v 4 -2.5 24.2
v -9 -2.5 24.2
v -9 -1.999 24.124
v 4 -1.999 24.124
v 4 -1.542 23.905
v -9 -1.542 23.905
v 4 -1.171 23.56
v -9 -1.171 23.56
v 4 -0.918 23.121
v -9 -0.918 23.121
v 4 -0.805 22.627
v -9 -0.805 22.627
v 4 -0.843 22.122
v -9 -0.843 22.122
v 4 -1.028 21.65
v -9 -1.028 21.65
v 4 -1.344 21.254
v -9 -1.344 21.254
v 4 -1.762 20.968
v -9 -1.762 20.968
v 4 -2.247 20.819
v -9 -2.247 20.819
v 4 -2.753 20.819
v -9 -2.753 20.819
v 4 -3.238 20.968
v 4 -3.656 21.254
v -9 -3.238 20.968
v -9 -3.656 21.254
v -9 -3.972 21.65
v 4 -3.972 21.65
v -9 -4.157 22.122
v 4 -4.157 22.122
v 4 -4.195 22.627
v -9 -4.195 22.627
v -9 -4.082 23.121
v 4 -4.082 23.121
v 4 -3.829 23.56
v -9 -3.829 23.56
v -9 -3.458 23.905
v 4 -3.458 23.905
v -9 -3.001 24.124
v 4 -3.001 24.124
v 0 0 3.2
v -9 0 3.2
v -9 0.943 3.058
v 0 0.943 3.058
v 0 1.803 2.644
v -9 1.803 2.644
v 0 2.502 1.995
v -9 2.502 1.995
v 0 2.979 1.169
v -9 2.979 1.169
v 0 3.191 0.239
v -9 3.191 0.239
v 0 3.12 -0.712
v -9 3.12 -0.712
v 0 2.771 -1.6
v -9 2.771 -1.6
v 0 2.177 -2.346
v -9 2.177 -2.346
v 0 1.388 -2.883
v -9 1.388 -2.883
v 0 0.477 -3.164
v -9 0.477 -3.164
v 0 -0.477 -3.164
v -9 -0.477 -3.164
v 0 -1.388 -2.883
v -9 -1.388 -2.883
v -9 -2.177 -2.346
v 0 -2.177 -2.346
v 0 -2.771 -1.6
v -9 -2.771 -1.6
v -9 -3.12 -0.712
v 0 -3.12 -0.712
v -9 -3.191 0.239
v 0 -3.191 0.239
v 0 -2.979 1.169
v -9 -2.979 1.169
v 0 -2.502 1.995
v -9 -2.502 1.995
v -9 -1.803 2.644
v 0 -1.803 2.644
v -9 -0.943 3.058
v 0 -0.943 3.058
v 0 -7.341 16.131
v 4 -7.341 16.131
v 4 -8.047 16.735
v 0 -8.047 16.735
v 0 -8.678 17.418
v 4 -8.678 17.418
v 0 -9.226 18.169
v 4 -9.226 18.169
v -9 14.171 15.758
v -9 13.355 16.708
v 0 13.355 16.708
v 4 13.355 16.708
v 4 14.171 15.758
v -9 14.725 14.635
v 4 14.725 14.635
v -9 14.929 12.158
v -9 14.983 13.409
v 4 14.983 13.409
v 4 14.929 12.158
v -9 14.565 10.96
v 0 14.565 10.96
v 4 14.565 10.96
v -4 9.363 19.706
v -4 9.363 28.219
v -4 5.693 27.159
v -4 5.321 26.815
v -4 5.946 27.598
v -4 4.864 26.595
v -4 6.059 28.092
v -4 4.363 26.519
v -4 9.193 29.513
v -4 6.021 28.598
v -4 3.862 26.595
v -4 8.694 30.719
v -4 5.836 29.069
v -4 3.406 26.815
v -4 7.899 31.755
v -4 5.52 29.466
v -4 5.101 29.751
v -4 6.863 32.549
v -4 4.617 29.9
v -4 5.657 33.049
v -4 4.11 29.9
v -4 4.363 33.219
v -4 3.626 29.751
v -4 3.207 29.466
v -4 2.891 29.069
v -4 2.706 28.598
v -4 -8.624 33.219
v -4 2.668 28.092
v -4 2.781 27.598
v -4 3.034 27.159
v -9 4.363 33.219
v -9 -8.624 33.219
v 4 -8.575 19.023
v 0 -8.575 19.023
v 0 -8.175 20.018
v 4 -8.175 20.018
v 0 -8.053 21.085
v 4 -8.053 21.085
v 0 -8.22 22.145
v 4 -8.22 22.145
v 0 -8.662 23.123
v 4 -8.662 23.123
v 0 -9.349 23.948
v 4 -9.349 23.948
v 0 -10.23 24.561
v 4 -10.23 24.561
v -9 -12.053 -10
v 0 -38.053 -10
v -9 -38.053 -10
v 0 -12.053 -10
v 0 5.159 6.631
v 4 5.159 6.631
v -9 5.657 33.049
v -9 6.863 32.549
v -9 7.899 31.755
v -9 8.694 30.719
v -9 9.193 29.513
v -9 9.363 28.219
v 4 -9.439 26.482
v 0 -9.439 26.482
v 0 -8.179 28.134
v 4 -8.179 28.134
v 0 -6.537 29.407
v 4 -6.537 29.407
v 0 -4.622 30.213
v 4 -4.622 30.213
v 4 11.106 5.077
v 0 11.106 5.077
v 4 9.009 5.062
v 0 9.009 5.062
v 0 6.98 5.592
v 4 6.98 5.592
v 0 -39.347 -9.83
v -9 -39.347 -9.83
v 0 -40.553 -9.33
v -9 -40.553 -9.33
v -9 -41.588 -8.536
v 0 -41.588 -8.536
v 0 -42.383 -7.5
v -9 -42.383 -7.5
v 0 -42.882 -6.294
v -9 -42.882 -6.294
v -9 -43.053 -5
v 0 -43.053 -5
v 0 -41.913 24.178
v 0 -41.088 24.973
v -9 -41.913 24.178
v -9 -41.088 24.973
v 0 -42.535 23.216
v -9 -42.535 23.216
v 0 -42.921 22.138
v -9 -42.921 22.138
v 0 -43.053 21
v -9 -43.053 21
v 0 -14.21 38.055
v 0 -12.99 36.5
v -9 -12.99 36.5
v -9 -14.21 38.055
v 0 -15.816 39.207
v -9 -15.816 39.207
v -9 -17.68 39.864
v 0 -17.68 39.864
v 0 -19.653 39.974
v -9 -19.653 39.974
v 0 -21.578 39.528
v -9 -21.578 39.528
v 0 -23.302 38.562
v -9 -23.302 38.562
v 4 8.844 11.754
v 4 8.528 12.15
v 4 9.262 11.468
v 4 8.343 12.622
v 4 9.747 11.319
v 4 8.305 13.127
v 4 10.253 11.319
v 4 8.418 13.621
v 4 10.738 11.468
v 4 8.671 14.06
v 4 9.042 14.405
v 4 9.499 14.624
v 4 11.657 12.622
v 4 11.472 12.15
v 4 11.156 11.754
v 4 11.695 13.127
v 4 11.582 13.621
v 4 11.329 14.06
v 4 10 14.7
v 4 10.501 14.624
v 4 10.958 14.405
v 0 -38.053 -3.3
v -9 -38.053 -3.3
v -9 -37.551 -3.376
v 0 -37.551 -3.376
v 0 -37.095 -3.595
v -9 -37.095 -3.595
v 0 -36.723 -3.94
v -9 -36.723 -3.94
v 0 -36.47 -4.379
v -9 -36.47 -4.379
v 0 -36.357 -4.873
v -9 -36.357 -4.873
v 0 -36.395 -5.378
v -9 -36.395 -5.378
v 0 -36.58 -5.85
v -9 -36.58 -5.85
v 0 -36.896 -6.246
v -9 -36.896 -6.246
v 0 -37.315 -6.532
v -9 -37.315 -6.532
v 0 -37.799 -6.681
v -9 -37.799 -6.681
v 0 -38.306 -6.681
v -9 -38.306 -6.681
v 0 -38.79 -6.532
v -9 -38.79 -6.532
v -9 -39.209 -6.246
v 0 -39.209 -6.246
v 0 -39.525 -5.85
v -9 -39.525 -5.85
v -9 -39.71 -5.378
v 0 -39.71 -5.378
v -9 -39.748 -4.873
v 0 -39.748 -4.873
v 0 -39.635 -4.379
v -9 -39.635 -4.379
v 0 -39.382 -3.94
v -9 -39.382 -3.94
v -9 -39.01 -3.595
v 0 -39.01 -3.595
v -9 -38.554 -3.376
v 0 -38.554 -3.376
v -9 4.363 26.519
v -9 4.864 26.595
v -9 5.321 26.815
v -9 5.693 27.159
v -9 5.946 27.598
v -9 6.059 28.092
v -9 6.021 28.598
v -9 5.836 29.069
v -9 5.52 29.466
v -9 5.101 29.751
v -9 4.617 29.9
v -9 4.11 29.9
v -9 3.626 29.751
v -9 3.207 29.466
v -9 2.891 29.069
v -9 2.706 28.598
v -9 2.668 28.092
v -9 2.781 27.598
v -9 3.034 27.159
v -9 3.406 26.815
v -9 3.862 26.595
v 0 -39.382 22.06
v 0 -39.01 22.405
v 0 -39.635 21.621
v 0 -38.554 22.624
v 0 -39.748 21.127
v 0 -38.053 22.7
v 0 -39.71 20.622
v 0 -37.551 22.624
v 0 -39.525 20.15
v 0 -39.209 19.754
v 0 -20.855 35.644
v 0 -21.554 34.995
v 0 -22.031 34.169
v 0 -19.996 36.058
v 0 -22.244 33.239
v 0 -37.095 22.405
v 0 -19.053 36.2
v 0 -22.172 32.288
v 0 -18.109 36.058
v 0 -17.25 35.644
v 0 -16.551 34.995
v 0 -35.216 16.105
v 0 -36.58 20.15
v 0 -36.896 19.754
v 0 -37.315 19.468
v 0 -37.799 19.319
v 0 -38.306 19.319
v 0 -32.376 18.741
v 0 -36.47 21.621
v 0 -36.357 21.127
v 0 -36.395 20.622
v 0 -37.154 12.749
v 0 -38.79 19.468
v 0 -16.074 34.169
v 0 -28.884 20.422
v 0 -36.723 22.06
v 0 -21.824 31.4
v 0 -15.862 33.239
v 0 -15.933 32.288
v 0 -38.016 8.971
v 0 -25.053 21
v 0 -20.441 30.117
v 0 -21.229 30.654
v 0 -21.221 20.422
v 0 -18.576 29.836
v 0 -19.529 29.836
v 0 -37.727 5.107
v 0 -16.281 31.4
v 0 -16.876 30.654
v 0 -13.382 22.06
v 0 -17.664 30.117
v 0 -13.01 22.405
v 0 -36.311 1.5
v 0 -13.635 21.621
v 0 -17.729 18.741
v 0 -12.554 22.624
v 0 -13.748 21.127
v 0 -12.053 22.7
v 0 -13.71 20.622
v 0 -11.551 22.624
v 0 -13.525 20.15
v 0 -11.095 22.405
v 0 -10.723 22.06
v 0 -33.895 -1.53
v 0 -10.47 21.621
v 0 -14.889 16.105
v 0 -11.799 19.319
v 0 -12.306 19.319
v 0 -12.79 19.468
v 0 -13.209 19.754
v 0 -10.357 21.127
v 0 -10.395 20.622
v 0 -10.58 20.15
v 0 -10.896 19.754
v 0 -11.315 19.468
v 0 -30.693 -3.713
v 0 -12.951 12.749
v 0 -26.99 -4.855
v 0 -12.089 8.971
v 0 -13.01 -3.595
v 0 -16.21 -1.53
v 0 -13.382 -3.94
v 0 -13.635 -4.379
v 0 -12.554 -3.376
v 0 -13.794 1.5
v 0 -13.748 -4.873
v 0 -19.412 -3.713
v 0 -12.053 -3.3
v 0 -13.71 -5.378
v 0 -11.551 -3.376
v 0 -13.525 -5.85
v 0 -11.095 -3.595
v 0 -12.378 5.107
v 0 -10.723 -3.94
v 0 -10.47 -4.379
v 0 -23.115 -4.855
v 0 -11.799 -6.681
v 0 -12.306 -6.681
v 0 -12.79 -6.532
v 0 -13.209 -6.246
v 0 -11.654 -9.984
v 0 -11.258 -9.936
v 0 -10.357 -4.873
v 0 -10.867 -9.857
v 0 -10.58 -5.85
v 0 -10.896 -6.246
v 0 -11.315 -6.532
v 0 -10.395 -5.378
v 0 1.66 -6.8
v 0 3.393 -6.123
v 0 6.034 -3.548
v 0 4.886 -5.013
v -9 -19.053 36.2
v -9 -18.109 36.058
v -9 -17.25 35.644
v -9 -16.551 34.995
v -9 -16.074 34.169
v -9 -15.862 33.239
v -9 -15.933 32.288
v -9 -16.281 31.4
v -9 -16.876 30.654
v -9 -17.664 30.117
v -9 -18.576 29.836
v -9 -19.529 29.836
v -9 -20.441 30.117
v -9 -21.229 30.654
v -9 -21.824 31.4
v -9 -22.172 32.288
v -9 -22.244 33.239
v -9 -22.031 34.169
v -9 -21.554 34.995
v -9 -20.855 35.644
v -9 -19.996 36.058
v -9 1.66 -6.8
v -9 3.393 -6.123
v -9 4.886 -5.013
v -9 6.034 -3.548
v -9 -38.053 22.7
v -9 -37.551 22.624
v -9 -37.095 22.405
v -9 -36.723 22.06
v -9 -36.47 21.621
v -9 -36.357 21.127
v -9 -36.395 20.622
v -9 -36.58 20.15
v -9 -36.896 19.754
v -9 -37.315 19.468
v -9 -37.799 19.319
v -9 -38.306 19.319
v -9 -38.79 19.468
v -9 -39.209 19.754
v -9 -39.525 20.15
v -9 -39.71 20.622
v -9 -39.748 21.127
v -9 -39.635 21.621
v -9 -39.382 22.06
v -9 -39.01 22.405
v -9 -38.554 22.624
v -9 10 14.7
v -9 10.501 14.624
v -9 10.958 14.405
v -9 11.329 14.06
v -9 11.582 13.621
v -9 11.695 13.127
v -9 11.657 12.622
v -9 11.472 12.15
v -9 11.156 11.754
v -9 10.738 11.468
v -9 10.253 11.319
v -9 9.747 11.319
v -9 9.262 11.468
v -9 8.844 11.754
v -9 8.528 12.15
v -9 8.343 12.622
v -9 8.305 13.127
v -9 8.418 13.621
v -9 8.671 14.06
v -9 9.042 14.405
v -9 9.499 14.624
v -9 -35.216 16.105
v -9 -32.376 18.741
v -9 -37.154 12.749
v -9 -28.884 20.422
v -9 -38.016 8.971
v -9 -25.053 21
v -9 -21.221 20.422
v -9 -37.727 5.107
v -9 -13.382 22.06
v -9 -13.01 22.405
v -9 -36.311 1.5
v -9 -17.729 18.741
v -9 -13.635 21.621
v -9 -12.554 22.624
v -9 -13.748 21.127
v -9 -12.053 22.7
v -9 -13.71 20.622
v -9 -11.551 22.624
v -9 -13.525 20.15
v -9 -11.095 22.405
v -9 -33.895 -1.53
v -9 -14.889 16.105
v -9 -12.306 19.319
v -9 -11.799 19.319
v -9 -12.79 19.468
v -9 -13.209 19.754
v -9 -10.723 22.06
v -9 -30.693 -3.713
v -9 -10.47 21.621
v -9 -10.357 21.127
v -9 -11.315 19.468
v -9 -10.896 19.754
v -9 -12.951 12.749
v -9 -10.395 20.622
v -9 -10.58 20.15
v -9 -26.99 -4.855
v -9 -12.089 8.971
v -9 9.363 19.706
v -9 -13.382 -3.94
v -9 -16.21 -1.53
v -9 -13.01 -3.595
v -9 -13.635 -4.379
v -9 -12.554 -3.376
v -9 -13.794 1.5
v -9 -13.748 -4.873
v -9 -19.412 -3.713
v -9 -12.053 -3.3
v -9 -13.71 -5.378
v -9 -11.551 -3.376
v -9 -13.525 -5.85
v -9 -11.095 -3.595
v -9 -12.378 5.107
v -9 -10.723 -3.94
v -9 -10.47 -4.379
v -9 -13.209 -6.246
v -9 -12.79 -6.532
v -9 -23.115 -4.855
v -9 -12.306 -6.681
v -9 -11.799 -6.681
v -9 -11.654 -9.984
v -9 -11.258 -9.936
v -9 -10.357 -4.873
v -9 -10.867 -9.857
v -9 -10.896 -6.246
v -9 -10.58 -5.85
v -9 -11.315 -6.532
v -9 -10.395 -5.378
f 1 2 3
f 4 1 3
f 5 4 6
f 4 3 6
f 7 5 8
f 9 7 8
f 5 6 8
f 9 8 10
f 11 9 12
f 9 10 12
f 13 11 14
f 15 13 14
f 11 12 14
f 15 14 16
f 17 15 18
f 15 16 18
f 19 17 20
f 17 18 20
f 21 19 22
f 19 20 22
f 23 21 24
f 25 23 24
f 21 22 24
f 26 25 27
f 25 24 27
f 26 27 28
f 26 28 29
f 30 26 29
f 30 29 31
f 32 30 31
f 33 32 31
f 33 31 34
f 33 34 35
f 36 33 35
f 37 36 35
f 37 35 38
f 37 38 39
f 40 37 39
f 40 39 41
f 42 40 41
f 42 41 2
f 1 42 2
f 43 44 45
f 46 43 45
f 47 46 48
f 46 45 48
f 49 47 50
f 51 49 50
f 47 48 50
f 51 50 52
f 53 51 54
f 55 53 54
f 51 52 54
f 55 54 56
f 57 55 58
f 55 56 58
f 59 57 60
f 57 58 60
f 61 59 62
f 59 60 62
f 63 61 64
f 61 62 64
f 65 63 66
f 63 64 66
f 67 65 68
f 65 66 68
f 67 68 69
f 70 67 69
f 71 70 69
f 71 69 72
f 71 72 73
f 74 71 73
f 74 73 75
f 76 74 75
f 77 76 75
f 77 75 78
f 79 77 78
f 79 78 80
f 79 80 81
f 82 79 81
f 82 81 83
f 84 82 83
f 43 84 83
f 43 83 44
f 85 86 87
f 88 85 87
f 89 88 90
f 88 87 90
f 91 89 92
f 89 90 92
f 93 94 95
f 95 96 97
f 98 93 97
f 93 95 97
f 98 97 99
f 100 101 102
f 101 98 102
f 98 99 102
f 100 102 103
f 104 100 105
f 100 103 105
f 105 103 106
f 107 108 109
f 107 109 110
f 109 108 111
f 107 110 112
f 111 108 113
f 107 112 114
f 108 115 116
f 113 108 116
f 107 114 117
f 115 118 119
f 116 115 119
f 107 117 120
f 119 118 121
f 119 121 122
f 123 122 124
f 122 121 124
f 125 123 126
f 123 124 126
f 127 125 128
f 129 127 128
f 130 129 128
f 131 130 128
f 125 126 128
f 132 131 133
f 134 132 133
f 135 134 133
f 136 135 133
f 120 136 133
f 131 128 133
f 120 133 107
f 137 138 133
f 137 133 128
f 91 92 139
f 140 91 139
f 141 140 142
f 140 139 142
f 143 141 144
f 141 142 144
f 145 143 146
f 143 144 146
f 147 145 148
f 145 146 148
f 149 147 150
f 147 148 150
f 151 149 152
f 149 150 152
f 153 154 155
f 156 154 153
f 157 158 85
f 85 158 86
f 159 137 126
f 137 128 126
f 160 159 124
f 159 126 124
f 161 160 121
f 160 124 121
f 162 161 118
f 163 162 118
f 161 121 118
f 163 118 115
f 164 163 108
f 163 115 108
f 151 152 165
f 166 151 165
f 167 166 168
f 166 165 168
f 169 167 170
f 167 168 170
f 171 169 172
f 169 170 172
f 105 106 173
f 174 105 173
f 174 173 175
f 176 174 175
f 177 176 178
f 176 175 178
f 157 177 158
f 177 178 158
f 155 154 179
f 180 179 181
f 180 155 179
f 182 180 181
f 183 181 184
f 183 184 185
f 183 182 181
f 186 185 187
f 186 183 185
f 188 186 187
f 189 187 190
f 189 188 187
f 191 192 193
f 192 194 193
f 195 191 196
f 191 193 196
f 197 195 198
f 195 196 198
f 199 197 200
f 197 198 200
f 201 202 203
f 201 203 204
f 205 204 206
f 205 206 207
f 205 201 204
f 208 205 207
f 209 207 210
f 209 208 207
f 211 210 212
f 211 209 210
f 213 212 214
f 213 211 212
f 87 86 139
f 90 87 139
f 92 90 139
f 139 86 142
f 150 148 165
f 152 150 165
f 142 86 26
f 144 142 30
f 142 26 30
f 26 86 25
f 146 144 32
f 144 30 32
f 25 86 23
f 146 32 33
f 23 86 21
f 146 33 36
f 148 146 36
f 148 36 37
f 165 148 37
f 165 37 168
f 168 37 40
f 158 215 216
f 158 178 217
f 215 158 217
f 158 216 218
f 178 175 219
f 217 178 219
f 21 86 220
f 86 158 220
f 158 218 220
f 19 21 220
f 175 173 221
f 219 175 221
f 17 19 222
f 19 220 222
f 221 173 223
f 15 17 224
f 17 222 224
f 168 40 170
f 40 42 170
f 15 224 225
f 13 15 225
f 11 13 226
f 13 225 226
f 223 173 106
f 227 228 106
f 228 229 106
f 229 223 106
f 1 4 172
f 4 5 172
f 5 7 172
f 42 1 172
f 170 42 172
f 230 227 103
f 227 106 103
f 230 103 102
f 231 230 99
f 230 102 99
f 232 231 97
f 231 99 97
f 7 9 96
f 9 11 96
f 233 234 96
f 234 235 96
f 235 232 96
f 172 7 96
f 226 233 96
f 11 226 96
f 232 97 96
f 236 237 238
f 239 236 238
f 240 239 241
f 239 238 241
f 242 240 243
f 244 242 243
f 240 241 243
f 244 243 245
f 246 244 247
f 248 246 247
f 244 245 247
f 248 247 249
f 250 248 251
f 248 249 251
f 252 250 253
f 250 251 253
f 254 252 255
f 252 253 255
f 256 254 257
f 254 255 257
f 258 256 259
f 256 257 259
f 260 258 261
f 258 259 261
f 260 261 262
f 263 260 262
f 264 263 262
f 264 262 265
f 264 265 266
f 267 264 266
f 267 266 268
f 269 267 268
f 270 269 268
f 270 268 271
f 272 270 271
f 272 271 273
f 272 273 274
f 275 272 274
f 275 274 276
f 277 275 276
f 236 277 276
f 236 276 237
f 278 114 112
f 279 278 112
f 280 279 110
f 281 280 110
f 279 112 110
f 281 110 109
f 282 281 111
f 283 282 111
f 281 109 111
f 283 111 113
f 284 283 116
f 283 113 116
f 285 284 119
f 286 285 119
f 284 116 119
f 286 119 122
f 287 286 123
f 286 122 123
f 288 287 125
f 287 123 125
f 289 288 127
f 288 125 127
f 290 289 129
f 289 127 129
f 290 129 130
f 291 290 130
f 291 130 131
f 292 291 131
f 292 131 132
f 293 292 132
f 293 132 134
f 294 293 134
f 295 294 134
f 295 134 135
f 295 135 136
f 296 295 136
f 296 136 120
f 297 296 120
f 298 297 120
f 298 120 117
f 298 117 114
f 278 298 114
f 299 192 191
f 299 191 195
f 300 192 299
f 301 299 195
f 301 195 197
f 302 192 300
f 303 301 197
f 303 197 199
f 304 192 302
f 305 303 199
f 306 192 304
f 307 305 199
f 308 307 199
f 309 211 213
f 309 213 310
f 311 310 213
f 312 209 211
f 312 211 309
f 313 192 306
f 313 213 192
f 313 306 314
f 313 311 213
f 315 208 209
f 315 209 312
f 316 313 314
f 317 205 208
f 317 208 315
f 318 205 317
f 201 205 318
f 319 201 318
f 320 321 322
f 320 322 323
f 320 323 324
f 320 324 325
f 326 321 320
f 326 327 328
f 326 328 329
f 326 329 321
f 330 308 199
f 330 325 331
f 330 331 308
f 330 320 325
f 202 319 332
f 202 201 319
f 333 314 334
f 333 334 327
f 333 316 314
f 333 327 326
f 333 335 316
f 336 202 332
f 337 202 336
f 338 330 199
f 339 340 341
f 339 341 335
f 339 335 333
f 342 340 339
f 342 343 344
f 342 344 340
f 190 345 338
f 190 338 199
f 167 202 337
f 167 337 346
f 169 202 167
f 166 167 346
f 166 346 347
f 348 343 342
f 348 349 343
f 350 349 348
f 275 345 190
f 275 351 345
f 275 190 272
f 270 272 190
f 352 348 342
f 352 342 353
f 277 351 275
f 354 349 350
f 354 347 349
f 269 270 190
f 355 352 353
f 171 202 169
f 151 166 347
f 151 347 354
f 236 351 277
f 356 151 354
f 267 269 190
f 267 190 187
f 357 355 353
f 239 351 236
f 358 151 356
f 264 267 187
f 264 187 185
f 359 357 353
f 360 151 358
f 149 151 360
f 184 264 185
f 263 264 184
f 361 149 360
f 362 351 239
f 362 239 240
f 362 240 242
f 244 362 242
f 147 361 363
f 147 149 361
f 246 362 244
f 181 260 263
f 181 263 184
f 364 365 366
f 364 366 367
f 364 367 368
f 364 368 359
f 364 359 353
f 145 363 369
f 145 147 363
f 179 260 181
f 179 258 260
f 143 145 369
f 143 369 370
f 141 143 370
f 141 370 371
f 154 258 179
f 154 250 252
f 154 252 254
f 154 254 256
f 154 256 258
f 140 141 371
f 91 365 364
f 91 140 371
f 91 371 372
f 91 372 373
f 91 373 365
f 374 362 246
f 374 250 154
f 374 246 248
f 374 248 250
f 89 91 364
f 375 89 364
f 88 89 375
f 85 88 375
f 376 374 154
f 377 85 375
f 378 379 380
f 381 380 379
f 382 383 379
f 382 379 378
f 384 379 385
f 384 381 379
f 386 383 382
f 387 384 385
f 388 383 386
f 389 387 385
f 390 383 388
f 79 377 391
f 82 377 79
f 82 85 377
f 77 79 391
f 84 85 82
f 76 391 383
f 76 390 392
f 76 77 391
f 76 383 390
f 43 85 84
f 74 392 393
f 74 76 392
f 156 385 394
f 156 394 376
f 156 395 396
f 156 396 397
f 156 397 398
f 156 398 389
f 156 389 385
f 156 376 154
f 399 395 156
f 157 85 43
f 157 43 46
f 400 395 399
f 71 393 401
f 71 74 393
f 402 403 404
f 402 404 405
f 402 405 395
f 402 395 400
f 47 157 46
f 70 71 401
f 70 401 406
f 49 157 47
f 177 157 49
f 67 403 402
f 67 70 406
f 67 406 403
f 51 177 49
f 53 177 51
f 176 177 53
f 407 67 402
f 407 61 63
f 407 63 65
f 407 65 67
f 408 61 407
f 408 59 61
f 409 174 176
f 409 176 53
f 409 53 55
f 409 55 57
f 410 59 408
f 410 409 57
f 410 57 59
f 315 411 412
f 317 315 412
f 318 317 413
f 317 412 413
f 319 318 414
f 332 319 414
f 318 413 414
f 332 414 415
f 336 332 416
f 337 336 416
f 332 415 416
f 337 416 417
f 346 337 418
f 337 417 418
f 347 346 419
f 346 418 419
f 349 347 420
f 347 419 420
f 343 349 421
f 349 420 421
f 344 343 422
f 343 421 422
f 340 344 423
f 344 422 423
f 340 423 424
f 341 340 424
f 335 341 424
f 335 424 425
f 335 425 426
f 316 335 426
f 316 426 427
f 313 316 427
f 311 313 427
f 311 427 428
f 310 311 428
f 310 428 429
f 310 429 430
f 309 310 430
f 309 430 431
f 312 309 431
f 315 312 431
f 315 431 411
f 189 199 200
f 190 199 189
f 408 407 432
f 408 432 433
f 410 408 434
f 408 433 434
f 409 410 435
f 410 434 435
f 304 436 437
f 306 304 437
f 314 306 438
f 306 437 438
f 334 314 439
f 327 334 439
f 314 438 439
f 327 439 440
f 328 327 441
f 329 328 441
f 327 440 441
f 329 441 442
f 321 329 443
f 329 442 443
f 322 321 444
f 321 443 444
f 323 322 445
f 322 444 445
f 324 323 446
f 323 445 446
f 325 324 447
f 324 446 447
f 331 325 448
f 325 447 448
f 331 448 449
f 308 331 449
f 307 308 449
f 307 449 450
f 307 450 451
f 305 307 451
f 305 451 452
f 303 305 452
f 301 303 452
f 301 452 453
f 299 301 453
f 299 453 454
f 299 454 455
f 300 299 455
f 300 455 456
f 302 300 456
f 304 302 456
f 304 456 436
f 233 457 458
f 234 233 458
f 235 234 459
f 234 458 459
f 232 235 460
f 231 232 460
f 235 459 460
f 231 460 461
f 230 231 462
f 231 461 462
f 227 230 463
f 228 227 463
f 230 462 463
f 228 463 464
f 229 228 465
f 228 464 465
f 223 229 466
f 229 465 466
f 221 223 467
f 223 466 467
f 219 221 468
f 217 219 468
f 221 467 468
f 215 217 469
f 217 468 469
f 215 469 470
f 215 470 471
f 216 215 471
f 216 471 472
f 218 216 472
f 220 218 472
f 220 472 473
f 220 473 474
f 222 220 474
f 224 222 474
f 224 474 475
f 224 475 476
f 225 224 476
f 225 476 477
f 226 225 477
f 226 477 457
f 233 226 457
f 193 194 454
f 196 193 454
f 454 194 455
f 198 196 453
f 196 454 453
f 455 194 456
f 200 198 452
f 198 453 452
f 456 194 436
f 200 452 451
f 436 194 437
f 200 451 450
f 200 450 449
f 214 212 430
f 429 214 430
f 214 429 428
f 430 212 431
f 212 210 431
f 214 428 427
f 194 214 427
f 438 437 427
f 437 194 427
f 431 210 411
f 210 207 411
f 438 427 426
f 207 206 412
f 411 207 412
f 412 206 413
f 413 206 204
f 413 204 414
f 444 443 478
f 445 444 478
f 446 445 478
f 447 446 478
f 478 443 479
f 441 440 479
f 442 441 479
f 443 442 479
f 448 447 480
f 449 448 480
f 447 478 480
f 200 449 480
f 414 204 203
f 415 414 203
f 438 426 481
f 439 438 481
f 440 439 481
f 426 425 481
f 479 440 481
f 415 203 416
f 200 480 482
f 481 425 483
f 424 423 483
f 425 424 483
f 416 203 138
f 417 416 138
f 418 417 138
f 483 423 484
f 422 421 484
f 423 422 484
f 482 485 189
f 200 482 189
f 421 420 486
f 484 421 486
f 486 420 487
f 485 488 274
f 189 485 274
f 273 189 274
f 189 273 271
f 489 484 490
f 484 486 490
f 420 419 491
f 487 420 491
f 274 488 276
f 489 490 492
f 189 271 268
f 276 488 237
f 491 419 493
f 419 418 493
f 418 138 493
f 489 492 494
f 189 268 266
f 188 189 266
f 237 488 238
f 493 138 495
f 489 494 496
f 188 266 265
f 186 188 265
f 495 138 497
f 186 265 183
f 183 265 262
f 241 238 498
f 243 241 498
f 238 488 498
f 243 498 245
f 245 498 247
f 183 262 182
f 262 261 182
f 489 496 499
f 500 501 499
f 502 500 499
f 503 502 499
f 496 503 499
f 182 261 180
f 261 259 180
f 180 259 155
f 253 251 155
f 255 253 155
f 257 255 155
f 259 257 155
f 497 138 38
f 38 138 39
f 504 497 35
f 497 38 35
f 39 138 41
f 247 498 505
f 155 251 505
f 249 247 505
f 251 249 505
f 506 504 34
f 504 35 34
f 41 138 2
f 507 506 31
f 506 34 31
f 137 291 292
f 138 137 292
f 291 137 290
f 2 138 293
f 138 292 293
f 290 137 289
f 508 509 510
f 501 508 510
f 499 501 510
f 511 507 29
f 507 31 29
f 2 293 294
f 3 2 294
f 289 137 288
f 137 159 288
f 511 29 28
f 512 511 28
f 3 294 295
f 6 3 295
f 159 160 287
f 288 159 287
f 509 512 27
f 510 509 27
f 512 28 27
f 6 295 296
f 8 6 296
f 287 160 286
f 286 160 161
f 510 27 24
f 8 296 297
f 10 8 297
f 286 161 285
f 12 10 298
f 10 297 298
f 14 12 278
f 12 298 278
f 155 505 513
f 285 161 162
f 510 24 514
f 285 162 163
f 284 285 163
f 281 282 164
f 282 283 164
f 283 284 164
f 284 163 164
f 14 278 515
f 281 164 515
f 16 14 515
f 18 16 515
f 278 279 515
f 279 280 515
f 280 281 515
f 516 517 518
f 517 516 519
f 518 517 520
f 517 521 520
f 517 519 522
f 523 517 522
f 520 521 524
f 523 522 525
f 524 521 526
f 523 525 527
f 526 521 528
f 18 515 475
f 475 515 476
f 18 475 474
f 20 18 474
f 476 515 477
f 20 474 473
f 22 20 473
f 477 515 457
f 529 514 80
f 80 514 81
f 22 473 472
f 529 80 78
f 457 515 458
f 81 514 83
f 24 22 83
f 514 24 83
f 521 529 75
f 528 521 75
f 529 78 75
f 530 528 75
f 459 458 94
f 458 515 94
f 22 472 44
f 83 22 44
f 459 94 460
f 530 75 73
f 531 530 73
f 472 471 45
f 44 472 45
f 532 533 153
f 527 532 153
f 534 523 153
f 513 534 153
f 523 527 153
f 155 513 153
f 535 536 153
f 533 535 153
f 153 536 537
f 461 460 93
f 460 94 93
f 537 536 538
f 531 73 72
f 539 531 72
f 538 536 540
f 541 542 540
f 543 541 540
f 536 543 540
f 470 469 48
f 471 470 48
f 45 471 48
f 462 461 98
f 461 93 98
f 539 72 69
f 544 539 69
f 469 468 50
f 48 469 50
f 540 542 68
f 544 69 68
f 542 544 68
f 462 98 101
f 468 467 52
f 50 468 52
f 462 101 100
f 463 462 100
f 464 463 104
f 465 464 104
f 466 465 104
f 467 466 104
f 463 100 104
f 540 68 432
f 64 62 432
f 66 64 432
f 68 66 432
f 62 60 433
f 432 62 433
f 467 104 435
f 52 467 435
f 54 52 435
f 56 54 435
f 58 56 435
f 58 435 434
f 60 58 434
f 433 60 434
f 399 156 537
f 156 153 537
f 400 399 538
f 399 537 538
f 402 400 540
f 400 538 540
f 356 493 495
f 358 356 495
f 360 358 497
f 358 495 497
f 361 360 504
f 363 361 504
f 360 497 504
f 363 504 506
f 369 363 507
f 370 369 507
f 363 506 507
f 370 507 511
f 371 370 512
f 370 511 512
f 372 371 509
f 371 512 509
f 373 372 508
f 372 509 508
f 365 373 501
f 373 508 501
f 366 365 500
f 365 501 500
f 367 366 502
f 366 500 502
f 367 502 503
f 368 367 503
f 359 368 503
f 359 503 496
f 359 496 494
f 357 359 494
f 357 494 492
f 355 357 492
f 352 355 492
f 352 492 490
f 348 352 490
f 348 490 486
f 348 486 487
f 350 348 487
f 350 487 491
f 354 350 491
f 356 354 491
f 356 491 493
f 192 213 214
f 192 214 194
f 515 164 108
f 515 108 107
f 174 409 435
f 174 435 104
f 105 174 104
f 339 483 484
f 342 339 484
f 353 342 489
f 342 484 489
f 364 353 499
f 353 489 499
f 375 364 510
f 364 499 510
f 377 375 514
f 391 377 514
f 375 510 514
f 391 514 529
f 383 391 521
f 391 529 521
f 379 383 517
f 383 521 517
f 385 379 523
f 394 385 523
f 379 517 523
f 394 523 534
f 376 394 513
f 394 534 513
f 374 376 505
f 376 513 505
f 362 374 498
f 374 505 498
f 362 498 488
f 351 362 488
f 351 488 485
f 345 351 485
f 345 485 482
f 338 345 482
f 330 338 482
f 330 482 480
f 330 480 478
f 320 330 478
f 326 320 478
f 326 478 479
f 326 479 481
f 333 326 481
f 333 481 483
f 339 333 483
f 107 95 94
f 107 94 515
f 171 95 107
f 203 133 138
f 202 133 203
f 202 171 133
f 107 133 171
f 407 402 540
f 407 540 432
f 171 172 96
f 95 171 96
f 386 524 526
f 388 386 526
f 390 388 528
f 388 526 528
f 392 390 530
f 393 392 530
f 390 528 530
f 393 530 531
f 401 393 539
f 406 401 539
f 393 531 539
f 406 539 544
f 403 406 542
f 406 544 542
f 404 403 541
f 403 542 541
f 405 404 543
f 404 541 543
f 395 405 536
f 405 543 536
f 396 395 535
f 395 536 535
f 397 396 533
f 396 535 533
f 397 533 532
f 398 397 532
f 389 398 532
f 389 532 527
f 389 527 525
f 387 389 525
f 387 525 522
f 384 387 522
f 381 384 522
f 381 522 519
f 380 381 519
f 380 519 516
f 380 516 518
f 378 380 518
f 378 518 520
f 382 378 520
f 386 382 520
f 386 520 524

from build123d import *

# Parameters (mm, degrees)
BOSS_EXTRUDE1_DEPTH = 9
BOSS_EXTRUDE2_START = 4
BOSS_EXTRUDE2_DEPTH = 4
CUT_EXTRUDE1_DEPTH  = 4
BOSS_EXTRUDE3_DEPTH = 5
HOLE1_D             = 3.4
HOLE1_DEPTH         = 13.000025
HOLE2_D             = 3.4
HOLE3_D             = 3.4
HOLE4_D             = 26
HOLE5_D             = 3.4
HOLE6_D             = 3.4
HOLE7_D             = 3.4
HOLE8_D             = 3.4
HOLE9_D             = 6.4
HOLE10_D            = 6.4
FILLET1_R           = 5
FILLET2_R           = 5
FILLET3_R           = 5
FILLET4_R           = 5
FILLET5_R           = 7


with BuildPart() as part:
    # Sketch1 → Boss-Extrude1 (new body)
    with BuildSketch(Plane(origin=(0, 0, 0), x_dir=(0, 0, -1), z_dir=(1, 0, 0))):
        with BuildLine():
            Line((-16.707678896, 13.35456662), (-36.5, -12.990381057))
            ThreePointArc((-36.5, -12.990381057), (-39.864082969, -17.679837136), (-38.562263158, -23.302409299))
            Line((-38.562263158, -23.302409299), (-23.47214983, -43.052558883))
            Line((-23.47214983, -43.052558883), (10, -43.052558883))
            Line((10, -43.052558883), (10, -11.451281904))
            Line((10, -11.451281904), (6.09888089, 4.53429444))
            Line((6.09888089, 4.53429444), (-10.960043614, 14.564929128))
            ThreePointArc((-10.960043614, 14.564929128), (-14.030324678, 14.892691596), (-16.707678896, 13.35456662))
        make_face()
    extrude(amount=-BOSS_EXTRUDE1_DEPTH)

    # Sketch2 → Boss-Extrude2 (add)
    with BuildSketch(Plane(origin=(0, 0, 0), x_dir=(0, 0, -1), z_dir=(1, 0, 0)).offset(BOSS_EXTRUDE2_START)):
        with BuildLine():
            Line((-30.213330314, -4.622389094), (-16.707678896, 13.35456662))
            ThreePointArc((-16.707678896, 13.35456662), (-14.030324678, 14.892691596), (-10.960043614, 14.564929128))
            Line((-10.960043614, 14.564929128), (-5.076760086, 11.105562869))
            ThreePointArc((-5.076760086, 11.105562869), (-5.259937554, 7.977270822), (-6.630702447, 5.15933386))
            Line((-6.630702447, 5.15933386), (-16.130702447, -7.34066614))
            ThreePointArc((-16.130702447, -7.34066614), (-24.016200363, -10.355007095), (-30.213330314, -4.622389094))
        make_face()
    extrude(amount=-BOSS_EXTRUDE2_DEPTH)

    # Sketch3 → Cut-Extrude1 (cut)
    with BuildSketch(Plane(origin=(4, 0, 0), x_dir=(0, 0, -1), z_dir=(1, 0, 0))):
        with BuildLine():
            ThreePointArc((-24.560680199, -10.230045092), (-21.25899871, -10.403158596), (-18.1692777, -9.226428797))
            ThreePointArc((-18.1692777, -9.226428797), (-21.620500645, -8.100979585), (-24.560680199, -10.230045092))
        make_face()
    extrude(amount=-CUT_EXTRUDE1_DEPTH, mode=Mode.SUBTRACT)

    # Sketch4 → Boss-Extrude3 (add)
    with BuildSketch(Plane(origin=(-9, 0, 0), x_dir=(0, -1, 0), z_dir=(-1, 0, 0))):
        Polygon((-9.363394526, 33.219335817), (-9.363394526, 19.706149822), (8.623590229, 33.219335817), align=None)
    extrude(amount=-BOSS_EXTRUDE3_DEPTH)

    # Hole1
    with Locations(Plane.ZY.offset(9)):
        with Locations((28.219335817, 4.363394526)):
            Hole(HOLE1_D / 2, depth=HOLE1_DEPTH)

    # Hole2 (through all)
    with Locations(Plane(origin=(4, 0, 0), x_dir=(0, 0, -1), z_dir=(1, 0, 0))):
        with Locations((-13, 10)):
            Hole(HOLE2_D / 2)

    # Hole3 (through all)
    with Locations(Plane(origin=(4, 0, 0), x_dir=(0, 0, -1), z_dir=(1, 0, 0))):
        with Locations((-22.5, -2.5)):
            Hole(HOLE3_D / 2)

    # Hole4 (through all)
    with Locations(Plane(origin=(0, 0, 0), x_dir=(0, 0, -1), z_dir=(1, 0, 0))):
        with Locations((-8, -25.052558883)):
            Hole(HOLE4_D / 2)

    # Hole5 (through all)
    with Locations(Plane(origin=(0, 0, 0), x_dir=(0, 0, -1), z_dir=(1, 0, 0))):
        with Locations((5, -38.052558883)):
            Hole(HOLE5_D / 2)

    # Hole6 (through all)
    with Locations(Plane(origin=(0, 0, 0), x_dir=(0, 0, -1), z_dir=(1, 0, 0))):
        with Locations((-21, -38.052558883)):
            Hole(HOLE6_D / 2)

    # Hole7 (through all)
    with Locations(Plane(origin=(0, 0, 0), x_dir=(0, 0, -1), z_dir=(1, 0, 0))):
        with Locations((-21, -12.052558883)):
            Hole(HOLE7_D / 2)

    # Hole8 (through all)
    with Locations(Plane(origin=(0, 0, 0), x_dir=(0, 0, -1), z_dir=(1, 0, 0))):
        with Locations((5, -12.052558883)):
            Hole(HOLE8_D / 2)

    # Hole9 (through all)
    with Locations(Plane(origin=(0, 0, 0), x_dir=(0, 0, -1), z_dir=(1, 0, 0))):
        with Locations((0, 0)):
            Hole(HOLE9_D / 2)

    # Hole10 (through all)
    with Locations(Plane(origin=(0, 0, 0), x_dir=(0, 0, -1), z_dir=(1, 0, 0))):
        with Locations((-33, -19.052558883)):
            Hole(HOLE10_D / 2)

    # Fillet1
    fillet1_edges = [part.edges().sort_by_distance(p)[0] for p in [
        (-4.5, -43.052558883, -10),
    ]]
    fillet(fillet1_edges, radius=FILLET1_R)

    # Fillet2
    fillet2_edges = [part.edges().sort_by_distance(p)[0] for p in [
        (-4.5, -11.451281904, -10),
    ]]
    fillet(fillet2_edges, radius=FILLET2_R)

    # Fillet3
    fillet3_edges = [part.edges().sort_by_distance(p)[0] for p in [
        (-6.5, 9.363394526, 33.219335817),
    ]]
    fillet(fillet3_edges, radius=FILLET3_R)

    # Fillet4
    fillet4_edges = [part.edges().sort_by_distance(p)[0] for p in [
        (-4.5, -43.052558883, 23.47214983),
    ]]
    fillet(fillet4_edges, radius=FILLET4_R)

    # Fillet5
    fillet5_edges = [part.edges().sort_by_distance(p)[0] for p in [
        (-4.5, 4.53429444, -6.09888089),
    ]]
    fillet(fillet5_edges, radius=FILLET5_R)


solid = part.part
